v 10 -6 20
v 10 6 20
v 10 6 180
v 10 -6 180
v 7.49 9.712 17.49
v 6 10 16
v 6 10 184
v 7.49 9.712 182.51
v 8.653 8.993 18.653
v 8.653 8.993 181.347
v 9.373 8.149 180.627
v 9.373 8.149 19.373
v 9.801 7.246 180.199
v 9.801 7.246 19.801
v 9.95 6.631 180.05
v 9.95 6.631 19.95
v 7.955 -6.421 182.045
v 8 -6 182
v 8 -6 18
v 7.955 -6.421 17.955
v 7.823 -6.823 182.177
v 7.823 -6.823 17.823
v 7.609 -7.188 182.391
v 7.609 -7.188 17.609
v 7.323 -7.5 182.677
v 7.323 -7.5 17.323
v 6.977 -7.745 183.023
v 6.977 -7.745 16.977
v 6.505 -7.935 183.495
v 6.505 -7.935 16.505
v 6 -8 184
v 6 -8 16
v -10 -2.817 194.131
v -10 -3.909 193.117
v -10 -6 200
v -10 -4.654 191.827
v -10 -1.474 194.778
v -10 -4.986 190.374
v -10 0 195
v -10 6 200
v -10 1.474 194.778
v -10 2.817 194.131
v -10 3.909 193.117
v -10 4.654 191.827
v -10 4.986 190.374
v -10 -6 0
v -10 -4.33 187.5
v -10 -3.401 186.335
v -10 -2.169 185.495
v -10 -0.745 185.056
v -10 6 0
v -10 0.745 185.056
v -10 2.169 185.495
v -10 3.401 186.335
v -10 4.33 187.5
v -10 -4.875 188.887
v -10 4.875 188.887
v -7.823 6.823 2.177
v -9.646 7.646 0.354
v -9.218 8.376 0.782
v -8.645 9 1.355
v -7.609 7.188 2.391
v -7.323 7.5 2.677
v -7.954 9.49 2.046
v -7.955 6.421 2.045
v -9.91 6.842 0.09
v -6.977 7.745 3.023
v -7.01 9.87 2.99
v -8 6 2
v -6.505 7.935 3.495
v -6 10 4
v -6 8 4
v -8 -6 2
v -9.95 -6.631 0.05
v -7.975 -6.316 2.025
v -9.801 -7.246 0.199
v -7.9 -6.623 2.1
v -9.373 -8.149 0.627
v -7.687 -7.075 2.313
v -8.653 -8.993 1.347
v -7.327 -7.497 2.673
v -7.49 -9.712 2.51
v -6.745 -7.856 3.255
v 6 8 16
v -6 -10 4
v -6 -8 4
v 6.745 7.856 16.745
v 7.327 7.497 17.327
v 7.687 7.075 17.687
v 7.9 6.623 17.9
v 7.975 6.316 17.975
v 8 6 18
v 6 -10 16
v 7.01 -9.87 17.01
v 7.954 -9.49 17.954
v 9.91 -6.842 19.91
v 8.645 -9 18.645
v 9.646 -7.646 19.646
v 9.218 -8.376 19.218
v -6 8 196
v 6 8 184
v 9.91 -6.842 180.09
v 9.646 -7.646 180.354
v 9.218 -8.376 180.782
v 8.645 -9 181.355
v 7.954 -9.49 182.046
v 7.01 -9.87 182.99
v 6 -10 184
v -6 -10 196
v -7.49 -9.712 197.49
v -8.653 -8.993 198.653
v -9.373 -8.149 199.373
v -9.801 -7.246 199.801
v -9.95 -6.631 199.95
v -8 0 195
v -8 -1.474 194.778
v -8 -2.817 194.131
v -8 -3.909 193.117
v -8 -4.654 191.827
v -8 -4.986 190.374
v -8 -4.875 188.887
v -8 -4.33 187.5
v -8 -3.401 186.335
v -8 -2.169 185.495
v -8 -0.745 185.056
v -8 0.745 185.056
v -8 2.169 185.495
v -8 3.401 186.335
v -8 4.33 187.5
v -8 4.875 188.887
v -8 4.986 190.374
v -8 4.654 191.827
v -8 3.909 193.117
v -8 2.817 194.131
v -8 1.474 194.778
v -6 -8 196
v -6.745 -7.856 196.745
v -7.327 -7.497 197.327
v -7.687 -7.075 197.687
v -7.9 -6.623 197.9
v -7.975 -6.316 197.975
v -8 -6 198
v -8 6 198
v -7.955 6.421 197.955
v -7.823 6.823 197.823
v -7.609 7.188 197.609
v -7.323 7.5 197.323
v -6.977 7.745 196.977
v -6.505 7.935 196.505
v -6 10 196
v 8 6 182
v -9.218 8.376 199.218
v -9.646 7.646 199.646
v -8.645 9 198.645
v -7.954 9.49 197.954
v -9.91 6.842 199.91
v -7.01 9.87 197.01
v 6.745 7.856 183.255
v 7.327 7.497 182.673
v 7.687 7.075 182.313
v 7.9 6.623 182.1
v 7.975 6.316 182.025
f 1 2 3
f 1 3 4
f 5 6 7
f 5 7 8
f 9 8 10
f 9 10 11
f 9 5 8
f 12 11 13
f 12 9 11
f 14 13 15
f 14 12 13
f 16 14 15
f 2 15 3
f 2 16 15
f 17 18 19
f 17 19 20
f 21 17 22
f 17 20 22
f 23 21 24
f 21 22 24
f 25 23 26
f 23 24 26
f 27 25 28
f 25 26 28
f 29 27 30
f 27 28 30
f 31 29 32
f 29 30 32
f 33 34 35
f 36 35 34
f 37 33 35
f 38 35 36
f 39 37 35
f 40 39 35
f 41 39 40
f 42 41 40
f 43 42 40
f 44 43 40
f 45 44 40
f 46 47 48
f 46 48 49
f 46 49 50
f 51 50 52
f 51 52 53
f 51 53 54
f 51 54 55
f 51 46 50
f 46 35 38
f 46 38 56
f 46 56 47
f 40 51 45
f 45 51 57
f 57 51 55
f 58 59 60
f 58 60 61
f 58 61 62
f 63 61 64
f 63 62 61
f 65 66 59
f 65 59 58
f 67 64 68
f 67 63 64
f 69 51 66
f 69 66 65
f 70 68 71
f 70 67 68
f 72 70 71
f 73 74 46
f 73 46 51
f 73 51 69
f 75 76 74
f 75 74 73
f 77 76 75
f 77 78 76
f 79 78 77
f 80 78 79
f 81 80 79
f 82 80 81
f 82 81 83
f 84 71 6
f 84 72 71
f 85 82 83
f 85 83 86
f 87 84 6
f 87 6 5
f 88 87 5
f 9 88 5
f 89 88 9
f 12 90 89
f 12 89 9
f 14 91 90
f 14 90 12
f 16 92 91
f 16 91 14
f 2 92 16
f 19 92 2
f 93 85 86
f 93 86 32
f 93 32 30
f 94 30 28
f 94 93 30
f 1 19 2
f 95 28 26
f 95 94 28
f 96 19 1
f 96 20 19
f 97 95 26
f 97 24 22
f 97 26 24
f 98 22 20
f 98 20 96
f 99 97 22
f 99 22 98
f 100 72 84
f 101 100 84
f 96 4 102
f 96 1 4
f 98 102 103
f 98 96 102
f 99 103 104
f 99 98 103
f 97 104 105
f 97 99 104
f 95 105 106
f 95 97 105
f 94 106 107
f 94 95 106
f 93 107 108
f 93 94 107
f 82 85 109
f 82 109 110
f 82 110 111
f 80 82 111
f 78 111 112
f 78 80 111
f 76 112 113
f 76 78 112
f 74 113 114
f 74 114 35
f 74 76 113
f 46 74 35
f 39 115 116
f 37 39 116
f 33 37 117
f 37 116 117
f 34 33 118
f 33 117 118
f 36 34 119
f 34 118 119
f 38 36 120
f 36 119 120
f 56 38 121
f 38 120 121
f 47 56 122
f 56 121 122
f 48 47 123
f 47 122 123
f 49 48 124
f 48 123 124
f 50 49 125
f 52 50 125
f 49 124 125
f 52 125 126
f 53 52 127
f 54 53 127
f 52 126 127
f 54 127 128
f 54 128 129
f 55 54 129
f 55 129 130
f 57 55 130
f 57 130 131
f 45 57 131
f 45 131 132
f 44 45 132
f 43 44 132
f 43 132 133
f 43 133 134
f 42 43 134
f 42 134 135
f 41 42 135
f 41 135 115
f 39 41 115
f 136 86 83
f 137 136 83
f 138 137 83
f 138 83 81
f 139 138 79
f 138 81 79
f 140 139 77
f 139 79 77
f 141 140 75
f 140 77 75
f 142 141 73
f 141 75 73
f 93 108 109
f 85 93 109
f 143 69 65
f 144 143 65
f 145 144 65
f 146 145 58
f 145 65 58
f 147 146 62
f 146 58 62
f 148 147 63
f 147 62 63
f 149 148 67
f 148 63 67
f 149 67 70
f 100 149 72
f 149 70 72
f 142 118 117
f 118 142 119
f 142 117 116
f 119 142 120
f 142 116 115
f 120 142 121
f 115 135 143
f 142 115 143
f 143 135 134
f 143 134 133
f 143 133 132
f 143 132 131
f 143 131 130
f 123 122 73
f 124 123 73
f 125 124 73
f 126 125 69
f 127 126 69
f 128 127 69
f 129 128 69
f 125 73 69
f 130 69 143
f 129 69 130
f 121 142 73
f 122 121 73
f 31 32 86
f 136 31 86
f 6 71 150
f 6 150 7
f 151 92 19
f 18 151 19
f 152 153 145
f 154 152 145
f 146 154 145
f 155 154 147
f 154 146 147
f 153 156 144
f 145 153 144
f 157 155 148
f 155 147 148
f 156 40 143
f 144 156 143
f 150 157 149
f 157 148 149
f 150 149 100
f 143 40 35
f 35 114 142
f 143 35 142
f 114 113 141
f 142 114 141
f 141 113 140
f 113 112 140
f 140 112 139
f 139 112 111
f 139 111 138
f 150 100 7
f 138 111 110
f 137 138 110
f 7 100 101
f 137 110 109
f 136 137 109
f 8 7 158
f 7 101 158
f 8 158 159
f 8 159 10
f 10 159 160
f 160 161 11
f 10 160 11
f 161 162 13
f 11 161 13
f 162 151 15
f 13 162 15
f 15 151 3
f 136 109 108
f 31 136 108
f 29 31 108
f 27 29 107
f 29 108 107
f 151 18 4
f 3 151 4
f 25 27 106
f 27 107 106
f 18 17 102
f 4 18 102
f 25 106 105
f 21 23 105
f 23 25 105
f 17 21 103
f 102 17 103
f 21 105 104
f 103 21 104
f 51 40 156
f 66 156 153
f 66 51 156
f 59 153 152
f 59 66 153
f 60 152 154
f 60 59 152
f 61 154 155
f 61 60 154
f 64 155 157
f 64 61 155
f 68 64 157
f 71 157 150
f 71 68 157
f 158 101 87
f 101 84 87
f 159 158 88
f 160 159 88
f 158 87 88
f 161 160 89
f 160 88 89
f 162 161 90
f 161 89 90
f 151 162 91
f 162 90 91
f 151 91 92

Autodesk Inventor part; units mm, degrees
ref_plane "YZ Plane" through (0, 0, 0) normal (1, 0, 0) x (0, 1, 0)
ref_plane "Piano iniziale" through (0, 0, 0) normal (0, 0, 1) x (1, 0, 0)
ref_plane "Piano finale" through (0, 0, 200) normal (0, 0, 1) x (1, 0, 0)
sketch "Schizzo" plane through (0, 0, 0) normal (0, 0, 1) x (1, 0, 0)
  line L0 (-10, -6) -> (-10, 6)
  line L1 (-6, 10) -> (6, 10)
  line L2 (10, 6) -> (10, -6)
  line L3 (6, -10) -> (-6, -10)
  arc A0 (-10, -6) -> (-6, -10) centre (-6, -6) ccw
  arc A1 (10, 6) -> (6, 10) centre (6, 6) ccw
  arc A2 (-6, 10) -> (-10, 6) centre (-6, 6) ccw
  arc A3 (6, -10) -> (10, -6) centre (6, -6) ccw
  arc A4 (-6, 8) -> (-8, 6) centre (-6, 6) ccw
  line L4 (-6, 8) -> (6, 8)
  arc A5 (8, 6) -> (6, 8) centre (6, 6) ccw
  line L5 (8, 6) -> (8, -6)
  arc A6 (6, -8) -> (8, -6) centre (6, -6) ccw
  line L6 (6, -8) -> (-6, -8)
  arc A7 (-8, -6) -> (-6, -8) centre (-6, -6) ccw
  line L7 (-8, -6) -> (-8, 6)
  line L8 (0, 15.1598) -> (0, -15.1598) construction
  line L9 (-15.1598, 0) -> (15.1598, 0) construction
  dimension "d7" = 4
  dimension "d9" = 20
  dimension "d11" = 20
  dimension "d12" = 2
  dimension "d15" = 10
  dimension "d16" = 10
extrude "Corpo" add sketch "Schizzo" along normal up to surface (200 mm away) from surface at 0
sketch "Sketch3" plane through (0, 0, 0) normal (0, 0, 1) x (1, 0, 0)
  line L0 (0, 0) -> (10, 0)
ref_plane "Work Plane3" through (0, 0, 0) normal (0, -1, 0) x (1, 0, 0)
sketch "Sketch4" plane through (0, 0, 0) normal (0, -1, 0) x (1, 0, 0)
  line L0 (-2, 0) -> (12, 0)
  line L1 (-2, 200) -> (12, 200)
  dimension "d18" = 200
sketch "Schizzo5" plane through (-6, -10, 0) normal (0, -1, 0) x (1, 0, 0)
  line L0 (-4, 0) -> (0, 0) projected
  line L1 (-4, 0) -> (27.2685, 31.2685)
  line L2 (-4, 0) -> (40.2203, 0) construction
  line L3 (27.2685, 31.2685) -> (27.2685, 0)
  line L4 (27.2685, 0) -> (-4, 0)
  line L5 (-4, 200) -> (31.4981, 164.5019)
  line L6 (-4, 200) -> (46.2019, 200) construction
  line L7 (31.4981, 164.5019) -> (31.4981, 200)
  line L8 (31.4981, 200) -> (-4, 200)
  point P0 (6, 0)
  dimension "d19" = 45
  dimension "d20" = 45
extrude "Estrusione2" cut sketch "Schizzo5" against normal up to next
sketch "Schizzo6" plane through (-10, 6, 0) normal (-1, 0, 0) x (0, 0, 1)
  line L0 (0, -12) -> (0, 0) projected
  line L1 (200, -12) -> (200, 0) projected
  point P0 (0, -6)
  point P1 (190, -6)
  point P2 (0, -6)
  dimension "d23" = 10
hole "Foro1" at (-10, 0, 190) direction (1, 0, 0) diameter 10 end through all
equation "\"d7\" = G_IR"
equation "\"d9\" = G_W"
equation "\"d11\" = G_H"
equation "\"d12\" = G_T"
equation "\"d15\" = 0.5 * d9"
equation "\"d16\" = 0.5 * d11"
equation "\"d3\" = G_L"
equation "\"G_W\" = 20"
equation "\"G_H\" = 20"
equation "\"G_T\" = 2"
equation "\"G_IR\" = 4"
equation "\"G_L\" = d18"
equation "\"G_OFFSET_START\" = 0"
equation "\"G_OFFSET_END\" = 0"
properties part number "ISO 10799-2 - 20x20x2 - 200" material "Acciaio, Dolce"
